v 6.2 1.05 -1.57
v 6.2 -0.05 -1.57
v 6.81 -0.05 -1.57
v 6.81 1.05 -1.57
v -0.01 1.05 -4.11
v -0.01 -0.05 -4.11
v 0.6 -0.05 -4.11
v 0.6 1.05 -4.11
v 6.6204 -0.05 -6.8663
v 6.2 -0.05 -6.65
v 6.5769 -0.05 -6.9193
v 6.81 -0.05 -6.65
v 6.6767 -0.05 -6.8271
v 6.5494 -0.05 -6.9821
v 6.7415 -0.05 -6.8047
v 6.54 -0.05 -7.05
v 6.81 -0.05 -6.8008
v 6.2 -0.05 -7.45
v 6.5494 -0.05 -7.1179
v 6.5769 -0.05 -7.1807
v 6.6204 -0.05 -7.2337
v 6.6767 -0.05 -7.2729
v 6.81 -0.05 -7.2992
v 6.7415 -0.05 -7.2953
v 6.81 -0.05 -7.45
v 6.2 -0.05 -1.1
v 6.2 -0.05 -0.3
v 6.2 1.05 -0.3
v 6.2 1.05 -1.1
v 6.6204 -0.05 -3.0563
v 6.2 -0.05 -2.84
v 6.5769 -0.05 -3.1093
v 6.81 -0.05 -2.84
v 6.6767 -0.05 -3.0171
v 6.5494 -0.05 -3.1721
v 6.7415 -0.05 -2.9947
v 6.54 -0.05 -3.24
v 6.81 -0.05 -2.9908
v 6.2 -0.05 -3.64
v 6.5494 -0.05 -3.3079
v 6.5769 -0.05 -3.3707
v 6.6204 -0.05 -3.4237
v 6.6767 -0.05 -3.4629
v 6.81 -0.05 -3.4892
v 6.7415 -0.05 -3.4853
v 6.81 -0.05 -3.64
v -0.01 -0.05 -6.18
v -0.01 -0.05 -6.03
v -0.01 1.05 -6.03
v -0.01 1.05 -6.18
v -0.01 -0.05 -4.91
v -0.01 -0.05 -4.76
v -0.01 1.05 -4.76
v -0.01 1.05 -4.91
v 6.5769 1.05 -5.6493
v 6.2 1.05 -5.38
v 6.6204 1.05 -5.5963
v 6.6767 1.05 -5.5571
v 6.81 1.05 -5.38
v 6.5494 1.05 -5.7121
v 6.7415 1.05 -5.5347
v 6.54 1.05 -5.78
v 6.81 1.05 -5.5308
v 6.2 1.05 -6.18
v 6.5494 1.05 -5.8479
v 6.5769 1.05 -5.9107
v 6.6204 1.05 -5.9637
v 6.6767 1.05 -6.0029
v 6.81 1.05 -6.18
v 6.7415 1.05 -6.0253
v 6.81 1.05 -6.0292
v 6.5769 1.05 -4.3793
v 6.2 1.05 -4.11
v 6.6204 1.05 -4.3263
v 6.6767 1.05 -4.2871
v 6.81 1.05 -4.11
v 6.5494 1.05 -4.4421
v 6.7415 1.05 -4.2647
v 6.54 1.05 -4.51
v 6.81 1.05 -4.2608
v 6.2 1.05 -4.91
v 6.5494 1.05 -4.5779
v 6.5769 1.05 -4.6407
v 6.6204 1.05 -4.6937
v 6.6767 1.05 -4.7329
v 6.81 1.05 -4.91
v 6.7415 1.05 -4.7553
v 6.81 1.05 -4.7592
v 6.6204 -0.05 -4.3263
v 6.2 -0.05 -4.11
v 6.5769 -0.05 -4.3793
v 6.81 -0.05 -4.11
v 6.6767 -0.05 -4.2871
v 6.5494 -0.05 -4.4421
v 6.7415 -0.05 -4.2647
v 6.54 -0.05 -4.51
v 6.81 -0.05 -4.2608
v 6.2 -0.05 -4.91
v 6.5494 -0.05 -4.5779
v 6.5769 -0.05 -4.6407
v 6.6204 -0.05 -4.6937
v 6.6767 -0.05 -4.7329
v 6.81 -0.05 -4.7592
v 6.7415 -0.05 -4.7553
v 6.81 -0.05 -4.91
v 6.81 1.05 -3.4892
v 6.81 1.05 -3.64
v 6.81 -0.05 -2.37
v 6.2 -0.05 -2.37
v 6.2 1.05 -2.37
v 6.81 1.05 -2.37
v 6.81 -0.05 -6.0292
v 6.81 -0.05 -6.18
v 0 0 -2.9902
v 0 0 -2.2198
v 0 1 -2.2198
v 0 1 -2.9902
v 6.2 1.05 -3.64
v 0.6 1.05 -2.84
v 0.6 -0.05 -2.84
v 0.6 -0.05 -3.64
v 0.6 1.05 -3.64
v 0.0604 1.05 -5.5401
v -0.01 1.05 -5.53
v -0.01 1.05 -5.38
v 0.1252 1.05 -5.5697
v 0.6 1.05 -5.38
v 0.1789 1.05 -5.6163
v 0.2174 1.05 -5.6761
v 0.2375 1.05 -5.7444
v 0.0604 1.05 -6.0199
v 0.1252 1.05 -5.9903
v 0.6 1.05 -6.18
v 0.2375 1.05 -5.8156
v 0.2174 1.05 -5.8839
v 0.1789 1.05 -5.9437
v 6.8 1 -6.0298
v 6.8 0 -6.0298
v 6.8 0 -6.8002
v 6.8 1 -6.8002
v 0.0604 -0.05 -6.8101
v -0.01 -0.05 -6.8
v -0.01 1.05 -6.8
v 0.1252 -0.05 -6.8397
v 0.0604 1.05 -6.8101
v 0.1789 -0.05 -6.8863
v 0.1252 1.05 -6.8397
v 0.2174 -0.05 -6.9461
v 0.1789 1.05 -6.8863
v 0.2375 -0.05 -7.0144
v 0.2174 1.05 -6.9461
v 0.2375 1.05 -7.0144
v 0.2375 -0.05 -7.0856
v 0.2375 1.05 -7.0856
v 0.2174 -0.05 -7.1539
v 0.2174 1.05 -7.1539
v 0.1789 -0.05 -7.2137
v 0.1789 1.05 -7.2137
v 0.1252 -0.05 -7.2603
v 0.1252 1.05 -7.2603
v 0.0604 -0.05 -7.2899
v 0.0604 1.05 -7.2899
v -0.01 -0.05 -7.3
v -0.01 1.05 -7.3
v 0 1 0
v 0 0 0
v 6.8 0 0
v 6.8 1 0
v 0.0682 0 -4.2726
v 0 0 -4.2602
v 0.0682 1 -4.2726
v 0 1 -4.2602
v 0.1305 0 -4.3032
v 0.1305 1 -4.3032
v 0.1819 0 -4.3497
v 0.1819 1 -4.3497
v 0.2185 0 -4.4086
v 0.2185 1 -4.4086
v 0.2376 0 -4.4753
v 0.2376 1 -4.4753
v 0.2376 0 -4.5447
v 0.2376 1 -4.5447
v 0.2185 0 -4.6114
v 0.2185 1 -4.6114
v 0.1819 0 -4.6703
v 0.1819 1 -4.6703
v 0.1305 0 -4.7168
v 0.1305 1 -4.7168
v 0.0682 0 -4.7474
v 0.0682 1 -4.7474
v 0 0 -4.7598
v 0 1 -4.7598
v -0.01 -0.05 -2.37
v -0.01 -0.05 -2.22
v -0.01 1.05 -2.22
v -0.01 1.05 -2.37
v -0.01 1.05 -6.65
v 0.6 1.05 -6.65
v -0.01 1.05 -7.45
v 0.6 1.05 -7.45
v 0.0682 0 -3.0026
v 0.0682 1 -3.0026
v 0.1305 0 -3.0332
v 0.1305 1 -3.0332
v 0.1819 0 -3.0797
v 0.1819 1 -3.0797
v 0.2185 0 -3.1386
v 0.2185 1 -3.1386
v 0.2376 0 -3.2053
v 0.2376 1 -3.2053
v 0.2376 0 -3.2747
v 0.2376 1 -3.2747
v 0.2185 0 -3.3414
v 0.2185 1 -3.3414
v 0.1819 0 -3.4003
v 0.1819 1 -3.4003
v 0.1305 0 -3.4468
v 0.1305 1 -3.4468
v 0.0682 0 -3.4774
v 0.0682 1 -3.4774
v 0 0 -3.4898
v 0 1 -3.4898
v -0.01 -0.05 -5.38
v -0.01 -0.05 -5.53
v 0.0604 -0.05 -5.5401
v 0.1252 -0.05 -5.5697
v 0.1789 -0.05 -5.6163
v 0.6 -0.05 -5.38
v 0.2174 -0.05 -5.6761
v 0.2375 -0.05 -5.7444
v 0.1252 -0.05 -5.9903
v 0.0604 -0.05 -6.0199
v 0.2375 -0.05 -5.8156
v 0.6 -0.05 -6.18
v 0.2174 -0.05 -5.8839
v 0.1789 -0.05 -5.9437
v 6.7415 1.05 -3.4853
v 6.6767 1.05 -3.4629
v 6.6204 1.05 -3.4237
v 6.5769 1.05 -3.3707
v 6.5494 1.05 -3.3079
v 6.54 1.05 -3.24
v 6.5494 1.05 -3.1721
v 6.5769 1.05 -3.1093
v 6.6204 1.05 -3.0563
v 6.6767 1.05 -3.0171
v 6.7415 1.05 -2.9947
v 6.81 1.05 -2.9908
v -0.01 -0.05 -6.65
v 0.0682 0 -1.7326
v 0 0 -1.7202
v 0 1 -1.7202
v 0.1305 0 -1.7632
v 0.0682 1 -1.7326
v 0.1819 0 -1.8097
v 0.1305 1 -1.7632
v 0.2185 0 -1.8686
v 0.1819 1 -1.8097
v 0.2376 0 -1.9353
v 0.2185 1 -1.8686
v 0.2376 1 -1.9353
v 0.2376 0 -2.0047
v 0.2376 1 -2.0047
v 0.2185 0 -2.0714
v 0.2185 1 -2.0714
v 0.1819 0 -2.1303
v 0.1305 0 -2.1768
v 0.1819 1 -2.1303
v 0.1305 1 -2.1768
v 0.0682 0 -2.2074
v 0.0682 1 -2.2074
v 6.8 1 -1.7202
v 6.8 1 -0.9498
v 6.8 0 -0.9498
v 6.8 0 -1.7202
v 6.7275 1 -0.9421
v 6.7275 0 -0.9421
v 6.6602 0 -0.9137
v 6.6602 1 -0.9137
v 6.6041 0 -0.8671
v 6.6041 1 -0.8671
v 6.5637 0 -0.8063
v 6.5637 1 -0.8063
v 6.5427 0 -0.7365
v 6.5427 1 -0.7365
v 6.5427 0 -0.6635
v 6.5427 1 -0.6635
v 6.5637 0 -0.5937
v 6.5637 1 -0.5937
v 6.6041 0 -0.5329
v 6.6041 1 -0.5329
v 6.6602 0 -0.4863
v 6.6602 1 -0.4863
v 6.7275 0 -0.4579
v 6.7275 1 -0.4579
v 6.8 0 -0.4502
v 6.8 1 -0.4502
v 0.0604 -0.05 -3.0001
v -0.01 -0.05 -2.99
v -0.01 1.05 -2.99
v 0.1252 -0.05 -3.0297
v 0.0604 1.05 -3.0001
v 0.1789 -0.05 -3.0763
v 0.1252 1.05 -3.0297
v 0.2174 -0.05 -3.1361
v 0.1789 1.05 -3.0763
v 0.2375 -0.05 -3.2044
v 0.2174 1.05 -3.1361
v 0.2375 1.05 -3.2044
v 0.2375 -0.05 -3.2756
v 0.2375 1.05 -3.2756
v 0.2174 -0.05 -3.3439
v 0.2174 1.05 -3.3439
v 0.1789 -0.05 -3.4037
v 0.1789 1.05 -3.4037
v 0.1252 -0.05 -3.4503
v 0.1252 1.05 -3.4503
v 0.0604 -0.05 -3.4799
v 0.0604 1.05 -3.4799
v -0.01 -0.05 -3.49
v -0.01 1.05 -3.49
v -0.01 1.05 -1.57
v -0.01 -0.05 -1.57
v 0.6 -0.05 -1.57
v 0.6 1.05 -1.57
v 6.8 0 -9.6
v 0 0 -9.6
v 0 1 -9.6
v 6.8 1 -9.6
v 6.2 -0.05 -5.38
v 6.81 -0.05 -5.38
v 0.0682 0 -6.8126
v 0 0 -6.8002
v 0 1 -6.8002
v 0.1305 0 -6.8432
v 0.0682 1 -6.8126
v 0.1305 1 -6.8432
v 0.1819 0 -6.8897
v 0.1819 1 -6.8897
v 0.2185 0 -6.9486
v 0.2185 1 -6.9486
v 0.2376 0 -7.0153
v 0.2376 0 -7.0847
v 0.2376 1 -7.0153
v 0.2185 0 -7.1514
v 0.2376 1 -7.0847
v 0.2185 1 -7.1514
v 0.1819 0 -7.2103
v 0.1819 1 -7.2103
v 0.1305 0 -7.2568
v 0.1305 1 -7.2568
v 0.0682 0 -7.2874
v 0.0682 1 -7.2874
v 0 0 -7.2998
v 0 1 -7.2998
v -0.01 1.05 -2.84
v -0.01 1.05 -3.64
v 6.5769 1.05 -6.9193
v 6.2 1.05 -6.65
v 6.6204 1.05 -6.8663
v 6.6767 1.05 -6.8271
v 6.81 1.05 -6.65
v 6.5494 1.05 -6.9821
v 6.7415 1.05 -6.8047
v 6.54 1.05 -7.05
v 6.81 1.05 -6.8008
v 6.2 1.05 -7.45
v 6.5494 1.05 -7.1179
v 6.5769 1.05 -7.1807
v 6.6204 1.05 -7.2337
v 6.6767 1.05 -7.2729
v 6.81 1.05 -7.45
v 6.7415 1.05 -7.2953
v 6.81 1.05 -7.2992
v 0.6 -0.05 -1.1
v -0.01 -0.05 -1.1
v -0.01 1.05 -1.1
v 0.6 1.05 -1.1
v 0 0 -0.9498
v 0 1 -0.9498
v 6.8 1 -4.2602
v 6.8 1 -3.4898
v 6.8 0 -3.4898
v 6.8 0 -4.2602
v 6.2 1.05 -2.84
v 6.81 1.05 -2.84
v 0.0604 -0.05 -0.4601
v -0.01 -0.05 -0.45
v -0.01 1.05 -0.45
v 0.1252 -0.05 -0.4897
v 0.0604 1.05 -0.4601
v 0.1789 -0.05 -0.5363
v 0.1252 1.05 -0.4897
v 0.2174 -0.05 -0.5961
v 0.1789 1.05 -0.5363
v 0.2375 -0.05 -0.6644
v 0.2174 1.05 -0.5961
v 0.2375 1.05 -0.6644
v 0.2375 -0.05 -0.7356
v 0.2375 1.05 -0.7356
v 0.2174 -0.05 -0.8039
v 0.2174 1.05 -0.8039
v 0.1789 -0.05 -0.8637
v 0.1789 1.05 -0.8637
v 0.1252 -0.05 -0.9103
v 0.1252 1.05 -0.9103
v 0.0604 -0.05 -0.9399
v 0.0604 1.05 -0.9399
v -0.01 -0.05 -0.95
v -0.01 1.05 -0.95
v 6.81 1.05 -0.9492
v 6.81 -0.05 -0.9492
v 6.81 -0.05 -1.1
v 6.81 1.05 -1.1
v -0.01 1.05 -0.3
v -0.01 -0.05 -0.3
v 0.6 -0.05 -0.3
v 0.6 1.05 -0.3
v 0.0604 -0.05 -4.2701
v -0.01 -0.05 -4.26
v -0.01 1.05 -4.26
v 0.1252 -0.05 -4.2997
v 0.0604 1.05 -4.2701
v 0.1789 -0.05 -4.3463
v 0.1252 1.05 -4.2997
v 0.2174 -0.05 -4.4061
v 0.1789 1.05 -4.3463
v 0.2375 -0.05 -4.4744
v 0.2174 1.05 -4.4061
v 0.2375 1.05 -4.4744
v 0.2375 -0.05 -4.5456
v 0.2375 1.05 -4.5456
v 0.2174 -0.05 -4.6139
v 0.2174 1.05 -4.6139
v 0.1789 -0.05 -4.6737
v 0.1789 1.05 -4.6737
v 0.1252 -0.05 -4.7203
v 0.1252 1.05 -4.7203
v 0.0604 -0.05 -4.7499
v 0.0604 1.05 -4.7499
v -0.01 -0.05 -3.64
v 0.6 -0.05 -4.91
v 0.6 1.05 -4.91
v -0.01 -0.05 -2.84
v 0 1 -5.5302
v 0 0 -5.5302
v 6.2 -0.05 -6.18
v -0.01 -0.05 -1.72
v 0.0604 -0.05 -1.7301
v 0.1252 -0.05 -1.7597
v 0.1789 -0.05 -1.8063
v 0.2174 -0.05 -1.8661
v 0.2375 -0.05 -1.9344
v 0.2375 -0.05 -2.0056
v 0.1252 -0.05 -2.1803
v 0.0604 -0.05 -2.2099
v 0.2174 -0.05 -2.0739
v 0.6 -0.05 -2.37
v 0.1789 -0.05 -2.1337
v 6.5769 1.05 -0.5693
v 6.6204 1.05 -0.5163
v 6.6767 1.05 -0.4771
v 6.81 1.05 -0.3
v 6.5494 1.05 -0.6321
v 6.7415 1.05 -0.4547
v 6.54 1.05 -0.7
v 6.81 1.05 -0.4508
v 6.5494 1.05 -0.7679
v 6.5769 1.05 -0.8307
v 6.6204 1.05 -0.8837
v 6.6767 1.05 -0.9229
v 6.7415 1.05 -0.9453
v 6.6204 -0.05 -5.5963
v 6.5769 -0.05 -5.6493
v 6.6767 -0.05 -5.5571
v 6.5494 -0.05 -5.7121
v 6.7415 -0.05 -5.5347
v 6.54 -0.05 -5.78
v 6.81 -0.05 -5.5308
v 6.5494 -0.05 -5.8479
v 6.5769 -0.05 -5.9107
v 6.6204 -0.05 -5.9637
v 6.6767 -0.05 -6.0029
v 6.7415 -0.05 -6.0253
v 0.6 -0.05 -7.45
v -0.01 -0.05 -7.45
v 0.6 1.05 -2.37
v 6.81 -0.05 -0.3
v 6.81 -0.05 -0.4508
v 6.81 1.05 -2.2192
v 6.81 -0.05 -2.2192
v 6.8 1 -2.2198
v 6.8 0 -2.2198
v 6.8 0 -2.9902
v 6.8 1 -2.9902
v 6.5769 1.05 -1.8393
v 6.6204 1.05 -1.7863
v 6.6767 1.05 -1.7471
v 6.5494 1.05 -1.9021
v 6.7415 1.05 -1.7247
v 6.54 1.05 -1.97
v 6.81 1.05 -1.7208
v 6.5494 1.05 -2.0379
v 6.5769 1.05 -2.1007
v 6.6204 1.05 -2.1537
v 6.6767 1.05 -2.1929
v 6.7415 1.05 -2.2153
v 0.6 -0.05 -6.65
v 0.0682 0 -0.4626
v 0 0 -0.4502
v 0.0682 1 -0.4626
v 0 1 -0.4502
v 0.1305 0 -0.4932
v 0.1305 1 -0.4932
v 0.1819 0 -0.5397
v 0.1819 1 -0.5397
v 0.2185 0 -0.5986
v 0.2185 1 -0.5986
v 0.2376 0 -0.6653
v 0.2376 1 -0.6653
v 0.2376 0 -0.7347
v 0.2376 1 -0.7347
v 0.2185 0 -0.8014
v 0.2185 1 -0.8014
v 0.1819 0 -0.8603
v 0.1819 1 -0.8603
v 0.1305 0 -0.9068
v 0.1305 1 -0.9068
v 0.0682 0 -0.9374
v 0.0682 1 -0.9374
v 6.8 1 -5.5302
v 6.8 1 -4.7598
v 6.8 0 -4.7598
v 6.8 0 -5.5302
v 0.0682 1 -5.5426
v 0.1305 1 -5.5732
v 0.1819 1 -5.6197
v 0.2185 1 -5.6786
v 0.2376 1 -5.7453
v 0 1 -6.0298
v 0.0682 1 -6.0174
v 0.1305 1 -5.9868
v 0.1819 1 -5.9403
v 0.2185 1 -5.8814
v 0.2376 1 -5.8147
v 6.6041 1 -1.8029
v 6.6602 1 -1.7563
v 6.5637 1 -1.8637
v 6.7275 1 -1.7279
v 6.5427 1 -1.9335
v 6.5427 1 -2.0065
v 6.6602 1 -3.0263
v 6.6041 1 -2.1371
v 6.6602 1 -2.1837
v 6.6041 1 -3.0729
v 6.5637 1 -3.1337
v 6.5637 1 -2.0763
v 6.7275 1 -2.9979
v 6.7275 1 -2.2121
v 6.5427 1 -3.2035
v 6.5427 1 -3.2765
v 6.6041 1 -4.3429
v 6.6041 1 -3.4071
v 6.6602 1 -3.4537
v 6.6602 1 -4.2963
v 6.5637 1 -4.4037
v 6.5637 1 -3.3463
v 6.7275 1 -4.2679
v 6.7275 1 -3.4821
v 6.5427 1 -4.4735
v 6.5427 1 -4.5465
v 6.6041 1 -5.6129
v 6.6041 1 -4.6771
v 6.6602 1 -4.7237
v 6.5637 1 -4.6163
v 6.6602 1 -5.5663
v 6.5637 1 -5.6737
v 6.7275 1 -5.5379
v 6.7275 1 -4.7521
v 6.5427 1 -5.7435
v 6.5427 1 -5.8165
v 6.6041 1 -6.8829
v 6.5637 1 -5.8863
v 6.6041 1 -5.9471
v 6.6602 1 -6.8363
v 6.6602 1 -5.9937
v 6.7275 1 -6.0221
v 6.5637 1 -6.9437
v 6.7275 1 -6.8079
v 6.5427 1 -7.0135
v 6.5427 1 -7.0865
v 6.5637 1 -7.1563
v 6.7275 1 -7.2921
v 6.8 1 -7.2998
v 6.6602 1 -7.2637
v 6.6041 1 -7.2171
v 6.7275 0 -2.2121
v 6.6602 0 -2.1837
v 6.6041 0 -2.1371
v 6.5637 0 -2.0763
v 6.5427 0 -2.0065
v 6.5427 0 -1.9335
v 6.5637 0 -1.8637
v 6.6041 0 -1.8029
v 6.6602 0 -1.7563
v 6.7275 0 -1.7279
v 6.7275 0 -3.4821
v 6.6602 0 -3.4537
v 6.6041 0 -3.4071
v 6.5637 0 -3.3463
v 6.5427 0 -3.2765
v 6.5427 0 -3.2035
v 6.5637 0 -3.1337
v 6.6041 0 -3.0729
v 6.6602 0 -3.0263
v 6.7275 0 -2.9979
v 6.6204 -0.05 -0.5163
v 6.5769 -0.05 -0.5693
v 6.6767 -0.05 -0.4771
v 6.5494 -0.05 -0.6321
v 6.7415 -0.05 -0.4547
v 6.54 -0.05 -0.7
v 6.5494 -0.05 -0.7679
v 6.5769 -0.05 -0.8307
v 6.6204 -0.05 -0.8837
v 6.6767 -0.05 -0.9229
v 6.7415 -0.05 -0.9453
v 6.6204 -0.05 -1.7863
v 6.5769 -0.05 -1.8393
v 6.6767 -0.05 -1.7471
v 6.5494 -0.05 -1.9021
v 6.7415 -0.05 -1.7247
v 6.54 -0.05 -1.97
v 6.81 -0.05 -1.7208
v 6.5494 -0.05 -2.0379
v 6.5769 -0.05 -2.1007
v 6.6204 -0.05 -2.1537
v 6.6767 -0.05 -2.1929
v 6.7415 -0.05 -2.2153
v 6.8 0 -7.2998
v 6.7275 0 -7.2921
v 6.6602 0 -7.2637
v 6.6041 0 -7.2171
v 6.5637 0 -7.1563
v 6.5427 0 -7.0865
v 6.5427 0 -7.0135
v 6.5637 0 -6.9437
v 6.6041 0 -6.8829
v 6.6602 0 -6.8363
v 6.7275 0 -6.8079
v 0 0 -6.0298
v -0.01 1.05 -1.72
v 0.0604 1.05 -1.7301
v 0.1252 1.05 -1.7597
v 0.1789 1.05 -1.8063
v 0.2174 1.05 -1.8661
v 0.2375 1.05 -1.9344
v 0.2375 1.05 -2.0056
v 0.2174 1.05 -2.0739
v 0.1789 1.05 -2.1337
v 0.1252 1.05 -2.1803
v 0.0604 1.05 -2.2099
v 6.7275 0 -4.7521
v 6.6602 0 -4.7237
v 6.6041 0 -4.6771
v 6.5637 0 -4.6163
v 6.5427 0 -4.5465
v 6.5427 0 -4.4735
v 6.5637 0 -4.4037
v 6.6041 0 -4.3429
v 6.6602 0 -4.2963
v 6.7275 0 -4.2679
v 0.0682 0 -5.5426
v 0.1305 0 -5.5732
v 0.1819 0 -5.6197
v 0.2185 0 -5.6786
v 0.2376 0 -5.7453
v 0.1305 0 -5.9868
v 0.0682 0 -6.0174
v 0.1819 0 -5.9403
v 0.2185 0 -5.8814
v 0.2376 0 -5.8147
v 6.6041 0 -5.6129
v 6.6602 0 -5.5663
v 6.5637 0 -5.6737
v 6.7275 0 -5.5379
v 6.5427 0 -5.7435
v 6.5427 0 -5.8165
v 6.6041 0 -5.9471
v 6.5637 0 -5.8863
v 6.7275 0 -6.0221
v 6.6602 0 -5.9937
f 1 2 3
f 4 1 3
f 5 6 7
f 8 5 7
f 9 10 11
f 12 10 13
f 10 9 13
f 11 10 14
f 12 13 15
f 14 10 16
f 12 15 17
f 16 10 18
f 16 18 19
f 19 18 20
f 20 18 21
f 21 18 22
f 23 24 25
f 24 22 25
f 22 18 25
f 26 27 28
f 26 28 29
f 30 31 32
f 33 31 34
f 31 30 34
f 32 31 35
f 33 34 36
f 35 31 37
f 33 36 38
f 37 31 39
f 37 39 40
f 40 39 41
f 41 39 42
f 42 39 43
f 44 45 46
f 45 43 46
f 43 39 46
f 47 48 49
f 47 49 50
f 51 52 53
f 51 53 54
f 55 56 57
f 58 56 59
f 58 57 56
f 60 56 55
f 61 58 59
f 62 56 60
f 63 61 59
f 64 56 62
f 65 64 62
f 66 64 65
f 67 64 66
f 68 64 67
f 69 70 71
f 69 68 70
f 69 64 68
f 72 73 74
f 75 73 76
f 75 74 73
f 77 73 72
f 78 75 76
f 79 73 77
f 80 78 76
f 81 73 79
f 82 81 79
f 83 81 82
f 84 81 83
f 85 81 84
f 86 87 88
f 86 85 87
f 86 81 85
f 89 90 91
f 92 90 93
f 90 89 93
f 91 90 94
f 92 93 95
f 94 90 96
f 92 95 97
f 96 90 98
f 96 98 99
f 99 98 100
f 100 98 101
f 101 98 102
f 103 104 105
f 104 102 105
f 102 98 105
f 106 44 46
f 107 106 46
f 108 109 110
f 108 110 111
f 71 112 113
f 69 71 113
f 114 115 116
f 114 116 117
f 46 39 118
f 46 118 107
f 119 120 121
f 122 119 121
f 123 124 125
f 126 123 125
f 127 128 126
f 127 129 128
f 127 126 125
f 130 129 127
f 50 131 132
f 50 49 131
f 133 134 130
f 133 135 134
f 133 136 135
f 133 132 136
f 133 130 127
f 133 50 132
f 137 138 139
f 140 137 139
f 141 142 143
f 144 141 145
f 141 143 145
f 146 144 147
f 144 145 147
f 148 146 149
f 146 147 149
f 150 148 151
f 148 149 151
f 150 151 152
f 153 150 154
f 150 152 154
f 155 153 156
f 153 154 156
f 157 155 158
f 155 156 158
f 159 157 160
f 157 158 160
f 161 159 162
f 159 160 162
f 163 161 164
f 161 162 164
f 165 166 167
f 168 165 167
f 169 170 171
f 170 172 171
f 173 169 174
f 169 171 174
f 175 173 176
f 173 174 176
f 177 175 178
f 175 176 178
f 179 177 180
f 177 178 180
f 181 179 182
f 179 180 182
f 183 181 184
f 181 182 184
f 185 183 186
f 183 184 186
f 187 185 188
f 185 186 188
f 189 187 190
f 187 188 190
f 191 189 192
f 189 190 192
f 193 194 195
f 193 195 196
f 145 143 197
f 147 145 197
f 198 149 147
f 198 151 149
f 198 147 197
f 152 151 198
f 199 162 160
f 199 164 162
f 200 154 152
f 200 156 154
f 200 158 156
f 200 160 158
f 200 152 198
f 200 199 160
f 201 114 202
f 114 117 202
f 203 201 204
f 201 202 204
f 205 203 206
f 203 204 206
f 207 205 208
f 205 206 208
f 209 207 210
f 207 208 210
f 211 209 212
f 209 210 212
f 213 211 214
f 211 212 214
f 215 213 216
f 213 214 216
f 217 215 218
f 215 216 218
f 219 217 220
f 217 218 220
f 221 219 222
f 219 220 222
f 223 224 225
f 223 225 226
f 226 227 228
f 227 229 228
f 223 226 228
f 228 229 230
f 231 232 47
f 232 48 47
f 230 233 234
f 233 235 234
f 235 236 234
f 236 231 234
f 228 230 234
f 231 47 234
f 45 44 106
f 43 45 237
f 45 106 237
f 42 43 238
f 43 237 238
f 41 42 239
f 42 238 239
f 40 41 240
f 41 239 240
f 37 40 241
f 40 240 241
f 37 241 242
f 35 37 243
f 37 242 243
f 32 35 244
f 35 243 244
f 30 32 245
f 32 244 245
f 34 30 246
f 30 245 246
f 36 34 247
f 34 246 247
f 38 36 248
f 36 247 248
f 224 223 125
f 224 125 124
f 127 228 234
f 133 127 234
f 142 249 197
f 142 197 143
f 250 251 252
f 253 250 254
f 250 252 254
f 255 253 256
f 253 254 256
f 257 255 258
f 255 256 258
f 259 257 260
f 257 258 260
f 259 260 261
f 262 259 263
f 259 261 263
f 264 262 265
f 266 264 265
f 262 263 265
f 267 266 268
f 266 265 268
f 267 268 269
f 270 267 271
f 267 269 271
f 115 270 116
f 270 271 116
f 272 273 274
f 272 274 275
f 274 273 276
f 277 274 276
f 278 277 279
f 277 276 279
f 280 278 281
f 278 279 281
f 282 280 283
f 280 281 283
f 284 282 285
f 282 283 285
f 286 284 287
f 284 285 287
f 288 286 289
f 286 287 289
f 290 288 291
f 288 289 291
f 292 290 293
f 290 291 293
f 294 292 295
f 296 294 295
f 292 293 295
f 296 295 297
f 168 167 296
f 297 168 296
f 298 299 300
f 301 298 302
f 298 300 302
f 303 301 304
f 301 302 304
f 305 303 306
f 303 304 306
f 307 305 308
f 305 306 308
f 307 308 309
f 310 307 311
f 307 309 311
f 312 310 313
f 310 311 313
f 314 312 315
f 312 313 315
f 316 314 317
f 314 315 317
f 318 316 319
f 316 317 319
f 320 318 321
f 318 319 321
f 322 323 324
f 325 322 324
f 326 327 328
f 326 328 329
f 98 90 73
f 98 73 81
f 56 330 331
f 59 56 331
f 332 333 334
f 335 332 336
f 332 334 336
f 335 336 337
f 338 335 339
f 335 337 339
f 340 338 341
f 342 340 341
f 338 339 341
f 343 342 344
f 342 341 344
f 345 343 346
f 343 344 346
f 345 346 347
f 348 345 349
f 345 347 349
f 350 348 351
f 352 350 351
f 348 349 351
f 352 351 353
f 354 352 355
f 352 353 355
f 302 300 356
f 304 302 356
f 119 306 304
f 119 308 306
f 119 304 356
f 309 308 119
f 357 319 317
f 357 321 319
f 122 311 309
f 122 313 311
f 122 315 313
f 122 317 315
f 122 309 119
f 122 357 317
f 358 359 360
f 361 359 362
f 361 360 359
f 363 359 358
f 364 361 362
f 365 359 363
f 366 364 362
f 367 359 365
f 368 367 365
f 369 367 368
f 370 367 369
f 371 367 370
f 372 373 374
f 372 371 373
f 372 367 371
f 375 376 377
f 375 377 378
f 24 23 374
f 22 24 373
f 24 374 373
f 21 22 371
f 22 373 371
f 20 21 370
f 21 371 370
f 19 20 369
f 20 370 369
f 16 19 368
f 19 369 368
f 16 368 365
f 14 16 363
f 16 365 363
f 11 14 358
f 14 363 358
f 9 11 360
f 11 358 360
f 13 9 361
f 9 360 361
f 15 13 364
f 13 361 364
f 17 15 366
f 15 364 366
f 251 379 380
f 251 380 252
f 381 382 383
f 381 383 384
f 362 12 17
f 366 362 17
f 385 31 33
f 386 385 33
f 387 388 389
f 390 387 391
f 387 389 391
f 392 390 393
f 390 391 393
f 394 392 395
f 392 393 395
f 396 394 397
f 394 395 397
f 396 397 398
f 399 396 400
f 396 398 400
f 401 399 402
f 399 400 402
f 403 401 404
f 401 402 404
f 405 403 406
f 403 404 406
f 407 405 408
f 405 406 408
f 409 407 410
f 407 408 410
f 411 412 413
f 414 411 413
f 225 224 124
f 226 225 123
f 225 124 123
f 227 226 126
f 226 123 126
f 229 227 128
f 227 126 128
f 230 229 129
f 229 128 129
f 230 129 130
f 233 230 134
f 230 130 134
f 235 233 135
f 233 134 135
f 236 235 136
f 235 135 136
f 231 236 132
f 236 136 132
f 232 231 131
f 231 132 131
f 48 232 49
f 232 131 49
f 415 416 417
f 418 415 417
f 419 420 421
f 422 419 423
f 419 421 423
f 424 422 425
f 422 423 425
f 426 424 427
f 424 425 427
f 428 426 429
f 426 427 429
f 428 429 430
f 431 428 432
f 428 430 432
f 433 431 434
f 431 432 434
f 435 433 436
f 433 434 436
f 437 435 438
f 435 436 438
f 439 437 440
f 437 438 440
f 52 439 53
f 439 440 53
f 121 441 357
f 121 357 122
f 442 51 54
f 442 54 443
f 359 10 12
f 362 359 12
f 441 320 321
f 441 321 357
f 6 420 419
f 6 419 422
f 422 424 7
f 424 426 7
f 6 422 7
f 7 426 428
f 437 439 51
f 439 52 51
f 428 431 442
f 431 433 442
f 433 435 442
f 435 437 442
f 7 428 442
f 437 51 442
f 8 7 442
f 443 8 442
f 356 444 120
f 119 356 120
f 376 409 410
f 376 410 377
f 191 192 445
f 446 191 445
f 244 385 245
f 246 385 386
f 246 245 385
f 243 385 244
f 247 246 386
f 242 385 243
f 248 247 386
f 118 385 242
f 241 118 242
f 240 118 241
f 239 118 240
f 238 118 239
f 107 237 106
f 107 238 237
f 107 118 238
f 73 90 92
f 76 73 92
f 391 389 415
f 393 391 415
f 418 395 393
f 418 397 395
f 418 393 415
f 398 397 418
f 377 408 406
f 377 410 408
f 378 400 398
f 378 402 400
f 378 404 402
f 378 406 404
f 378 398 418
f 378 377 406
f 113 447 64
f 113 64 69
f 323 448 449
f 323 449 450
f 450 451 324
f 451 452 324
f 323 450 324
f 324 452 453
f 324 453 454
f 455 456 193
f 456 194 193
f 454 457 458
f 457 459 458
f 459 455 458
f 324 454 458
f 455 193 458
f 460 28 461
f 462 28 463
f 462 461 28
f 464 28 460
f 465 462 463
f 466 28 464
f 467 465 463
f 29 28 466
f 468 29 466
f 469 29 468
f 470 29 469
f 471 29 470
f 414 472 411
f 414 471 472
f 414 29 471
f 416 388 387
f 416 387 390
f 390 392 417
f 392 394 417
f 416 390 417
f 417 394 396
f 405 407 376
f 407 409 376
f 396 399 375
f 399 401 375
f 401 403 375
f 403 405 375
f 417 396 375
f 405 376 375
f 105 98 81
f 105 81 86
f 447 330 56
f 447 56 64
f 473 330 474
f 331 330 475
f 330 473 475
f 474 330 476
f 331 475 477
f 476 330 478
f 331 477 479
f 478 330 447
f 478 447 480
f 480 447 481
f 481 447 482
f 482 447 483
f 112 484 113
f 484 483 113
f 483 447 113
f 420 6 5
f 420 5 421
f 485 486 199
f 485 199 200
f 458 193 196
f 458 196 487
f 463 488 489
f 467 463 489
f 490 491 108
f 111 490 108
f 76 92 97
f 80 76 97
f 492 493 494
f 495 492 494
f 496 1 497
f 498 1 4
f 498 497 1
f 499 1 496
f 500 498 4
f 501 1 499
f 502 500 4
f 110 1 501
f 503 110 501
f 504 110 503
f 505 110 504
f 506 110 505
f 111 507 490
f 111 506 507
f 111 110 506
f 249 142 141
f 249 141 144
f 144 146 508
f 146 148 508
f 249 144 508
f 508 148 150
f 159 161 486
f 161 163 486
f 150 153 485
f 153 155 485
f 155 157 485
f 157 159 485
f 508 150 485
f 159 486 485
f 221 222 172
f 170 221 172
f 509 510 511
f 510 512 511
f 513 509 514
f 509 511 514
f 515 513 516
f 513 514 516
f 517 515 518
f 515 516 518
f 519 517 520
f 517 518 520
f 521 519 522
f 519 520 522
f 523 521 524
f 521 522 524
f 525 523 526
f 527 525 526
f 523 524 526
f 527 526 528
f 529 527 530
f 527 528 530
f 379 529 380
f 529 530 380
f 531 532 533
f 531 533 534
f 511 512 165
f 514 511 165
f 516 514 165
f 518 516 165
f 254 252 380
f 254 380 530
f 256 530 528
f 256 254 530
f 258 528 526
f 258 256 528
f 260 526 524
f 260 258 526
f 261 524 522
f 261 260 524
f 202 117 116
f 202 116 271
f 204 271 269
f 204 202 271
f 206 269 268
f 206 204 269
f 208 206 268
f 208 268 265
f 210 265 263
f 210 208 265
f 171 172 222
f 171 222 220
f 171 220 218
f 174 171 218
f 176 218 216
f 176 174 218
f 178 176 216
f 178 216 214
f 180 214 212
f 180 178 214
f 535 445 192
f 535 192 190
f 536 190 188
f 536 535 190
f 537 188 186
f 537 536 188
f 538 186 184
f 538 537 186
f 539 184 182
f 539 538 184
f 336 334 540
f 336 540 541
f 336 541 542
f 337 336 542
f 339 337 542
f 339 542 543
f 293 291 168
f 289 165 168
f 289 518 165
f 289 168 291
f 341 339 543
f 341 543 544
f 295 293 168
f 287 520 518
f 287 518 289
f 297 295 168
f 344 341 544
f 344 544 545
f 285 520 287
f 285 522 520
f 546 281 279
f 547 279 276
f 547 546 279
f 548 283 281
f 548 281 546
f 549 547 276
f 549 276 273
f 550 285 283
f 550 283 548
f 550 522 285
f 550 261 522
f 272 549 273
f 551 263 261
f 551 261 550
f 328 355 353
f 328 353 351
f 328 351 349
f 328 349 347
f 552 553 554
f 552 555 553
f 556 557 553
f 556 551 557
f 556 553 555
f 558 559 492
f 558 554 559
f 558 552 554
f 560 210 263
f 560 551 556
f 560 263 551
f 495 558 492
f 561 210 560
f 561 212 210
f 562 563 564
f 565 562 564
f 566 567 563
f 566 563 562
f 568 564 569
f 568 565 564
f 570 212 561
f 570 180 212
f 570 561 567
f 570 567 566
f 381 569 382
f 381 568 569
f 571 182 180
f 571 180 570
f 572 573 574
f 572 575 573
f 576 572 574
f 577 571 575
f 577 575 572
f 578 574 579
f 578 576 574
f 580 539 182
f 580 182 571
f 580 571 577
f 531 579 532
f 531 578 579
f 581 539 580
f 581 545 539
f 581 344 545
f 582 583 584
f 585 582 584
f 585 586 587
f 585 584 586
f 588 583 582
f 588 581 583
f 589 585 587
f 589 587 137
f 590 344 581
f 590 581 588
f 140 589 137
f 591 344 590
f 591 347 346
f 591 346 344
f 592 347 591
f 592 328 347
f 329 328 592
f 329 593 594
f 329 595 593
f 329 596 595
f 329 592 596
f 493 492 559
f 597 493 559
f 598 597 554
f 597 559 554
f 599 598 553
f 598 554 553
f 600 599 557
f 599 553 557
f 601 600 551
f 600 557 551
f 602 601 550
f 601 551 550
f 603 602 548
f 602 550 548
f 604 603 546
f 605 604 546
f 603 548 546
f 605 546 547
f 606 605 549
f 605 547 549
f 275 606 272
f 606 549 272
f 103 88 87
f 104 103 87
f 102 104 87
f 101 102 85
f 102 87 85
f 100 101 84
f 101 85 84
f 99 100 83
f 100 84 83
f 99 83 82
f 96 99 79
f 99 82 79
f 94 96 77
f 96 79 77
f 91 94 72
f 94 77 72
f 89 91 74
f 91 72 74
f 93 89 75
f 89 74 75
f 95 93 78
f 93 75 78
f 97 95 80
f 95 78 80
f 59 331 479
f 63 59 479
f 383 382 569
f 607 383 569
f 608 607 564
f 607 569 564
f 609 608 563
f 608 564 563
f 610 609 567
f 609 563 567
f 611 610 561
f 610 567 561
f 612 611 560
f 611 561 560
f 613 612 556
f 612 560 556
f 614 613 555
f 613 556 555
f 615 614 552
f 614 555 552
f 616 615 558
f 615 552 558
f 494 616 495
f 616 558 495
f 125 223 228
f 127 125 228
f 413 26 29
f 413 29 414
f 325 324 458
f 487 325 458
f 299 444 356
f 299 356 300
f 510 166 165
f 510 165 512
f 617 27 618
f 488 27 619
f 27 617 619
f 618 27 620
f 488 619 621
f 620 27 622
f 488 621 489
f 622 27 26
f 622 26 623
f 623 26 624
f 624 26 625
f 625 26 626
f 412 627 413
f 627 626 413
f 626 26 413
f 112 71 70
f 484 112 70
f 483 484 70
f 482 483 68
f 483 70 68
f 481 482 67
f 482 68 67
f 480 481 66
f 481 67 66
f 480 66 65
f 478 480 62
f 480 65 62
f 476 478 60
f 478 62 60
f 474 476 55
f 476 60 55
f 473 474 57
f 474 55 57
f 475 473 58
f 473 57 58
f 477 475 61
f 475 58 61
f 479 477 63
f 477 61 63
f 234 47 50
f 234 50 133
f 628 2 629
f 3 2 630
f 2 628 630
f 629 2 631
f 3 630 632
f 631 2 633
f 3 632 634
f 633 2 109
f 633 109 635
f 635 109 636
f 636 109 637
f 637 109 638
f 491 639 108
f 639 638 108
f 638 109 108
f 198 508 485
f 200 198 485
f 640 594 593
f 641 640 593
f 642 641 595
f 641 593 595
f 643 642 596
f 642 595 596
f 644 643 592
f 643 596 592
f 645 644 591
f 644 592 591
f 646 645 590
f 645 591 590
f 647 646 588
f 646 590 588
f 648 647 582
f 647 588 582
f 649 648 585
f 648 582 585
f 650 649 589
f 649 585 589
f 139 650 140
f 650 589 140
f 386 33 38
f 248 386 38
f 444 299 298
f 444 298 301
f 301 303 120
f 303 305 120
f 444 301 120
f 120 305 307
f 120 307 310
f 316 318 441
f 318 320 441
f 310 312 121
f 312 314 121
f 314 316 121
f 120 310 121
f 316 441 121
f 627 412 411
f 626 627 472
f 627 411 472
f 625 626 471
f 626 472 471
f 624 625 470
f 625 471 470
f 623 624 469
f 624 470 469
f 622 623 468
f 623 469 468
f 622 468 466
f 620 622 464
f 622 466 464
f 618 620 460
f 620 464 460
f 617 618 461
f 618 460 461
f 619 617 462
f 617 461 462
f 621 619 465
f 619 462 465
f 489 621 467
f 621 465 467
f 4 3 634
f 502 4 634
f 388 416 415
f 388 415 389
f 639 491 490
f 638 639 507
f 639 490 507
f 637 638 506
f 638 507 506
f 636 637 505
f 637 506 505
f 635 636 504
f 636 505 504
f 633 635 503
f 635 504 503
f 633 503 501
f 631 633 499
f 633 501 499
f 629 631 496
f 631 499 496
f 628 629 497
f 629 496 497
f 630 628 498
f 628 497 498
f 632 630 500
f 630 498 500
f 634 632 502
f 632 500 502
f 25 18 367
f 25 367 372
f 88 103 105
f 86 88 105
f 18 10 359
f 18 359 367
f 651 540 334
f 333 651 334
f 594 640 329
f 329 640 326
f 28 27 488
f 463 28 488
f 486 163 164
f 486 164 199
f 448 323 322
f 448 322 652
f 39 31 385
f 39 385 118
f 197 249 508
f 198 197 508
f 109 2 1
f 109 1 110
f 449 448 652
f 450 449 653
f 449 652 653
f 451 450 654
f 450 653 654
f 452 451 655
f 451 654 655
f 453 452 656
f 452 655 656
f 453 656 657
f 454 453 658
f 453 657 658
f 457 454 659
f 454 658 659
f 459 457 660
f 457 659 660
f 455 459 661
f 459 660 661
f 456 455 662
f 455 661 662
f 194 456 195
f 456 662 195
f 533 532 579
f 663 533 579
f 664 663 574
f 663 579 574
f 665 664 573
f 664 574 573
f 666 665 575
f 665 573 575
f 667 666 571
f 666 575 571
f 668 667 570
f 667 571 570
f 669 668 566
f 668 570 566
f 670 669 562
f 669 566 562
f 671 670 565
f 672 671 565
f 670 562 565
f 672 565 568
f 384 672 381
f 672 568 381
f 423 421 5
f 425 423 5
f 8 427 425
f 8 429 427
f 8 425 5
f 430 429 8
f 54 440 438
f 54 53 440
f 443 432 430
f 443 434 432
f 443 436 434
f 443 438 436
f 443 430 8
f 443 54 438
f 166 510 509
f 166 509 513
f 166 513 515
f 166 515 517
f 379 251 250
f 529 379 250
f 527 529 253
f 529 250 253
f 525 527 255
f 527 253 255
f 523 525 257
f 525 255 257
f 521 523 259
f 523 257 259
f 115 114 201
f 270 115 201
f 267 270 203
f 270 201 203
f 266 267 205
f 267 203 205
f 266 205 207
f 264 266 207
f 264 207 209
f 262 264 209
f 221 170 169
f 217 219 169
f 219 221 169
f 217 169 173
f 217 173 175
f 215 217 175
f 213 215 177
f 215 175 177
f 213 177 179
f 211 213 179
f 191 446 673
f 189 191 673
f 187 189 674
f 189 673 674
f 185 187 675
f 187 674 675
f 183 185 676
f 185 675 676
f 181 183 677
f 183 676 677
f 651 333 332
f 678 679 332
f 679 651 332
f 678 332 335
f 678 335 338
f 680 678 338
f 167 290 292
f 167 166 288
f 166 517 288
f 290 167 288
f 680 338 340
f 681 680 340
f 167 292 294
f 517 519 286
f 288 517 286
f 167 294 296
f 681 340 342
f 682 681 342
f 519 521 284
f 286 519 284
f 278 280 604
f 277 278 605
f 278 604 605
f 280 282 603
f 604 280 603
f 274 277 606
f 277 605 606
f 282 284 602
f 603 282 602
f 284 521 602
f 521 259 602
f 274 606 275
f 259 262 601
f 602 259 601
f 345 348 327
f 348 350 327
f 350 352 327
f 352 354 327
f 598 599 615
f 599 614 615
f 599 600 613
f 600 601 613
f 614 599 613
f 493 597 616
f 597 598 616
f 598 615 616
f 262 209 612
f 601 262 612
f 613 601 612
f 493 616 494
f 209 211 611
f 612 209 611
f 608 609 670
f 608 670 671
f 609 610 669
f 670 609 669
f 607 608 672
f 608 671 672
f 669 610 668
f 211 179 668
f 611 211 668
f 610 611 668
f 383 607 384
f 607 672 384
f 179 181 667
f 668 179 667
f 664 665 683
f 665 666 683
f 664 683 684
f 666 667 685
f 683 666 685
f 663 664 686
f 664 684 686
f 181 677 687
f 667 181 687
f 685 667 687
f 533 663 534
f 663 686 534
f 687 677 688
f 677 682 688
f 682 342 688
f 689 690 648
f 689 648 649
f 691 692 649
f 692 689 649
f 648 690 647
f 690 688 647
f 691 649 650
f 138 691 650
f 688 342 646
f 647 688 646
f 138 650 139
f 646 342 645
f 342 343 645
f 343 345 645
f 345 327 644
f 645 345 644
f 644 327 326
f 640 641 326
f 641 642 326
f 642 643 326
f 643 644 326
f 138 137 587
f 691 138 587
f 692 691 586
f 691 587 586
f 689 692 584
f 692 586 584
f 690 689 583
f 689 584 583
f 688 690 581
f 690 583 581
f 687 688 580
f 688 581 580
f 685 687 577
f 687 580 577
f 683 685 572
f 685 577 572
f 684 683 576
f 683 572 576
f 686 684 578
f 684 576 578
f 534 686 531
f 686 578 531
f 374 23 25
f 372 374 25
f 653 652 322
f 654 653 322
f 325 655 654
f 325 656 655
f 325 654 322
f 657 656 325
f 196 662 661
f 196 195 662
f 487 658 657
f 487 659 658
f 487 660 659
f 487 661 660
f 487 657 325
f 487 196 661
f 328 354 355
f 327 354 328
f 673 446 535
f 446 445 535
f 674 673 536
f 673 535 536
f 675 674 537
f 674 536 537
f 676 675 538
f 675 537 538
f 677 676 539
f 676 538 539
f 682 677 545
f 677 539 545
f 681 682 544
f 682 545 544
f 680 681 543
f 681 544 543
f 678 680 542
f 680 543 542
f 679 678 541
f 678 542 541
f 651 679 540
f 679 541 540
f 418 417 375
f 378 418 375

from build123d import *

# Parameters (mm, degrees)
SKETCH_1_W              = 6.8
SKETCH_1_H              = 9.6
EXTRUDE_1_DEPTH         = 1
EXTRUDE_2_DEPTH         = 0.05
EXTRUDE_2_DEPTH_BACK    = 1.05
SKETCH_2_W              = 0.61
SKETCH_2_H              = 0.8
EXTRUDE_2_2_DEPTH       = 0.05
EXTRUDE_2_2_DEPTH_BACK  = 1.05
EXTRUDE_2_3_DEPTH       = 0.05
EXTRUDE_2_3_DEPTH_BACK  = 1.05
EXTRUDE_2_4_DEPTH       = 0.05
EXTRUDE_2_4_DEPTH_BACK  = 1.05
EXTRUDE_2_5_DEPTH       = 0.05
EXTRUDE_2_5_DEPTH_BACK  = 1.05
EXTRUDE_2_6_DEPTH       = 0.05
EXTRUDE_2_6_DEPTH_BACK  = 1.05
EXTRUDE_2_7_DEPTH       = 0.05
EXTRUDE_2_7_DEPTH_BACK  = 1.05
EXTRUDE_2_8_DEPTH       = 0.05
EXTRUDE_2_8_DEPTH_BACK  = 1.05
EXTRUDE_2_9_DEPTH       = 0.05
EXTRUDE_2_9_DEPTH_BACK  = 1.05
EXTRUDE_2_10_DEPTH      = 0.05
EXTRUDE_2_10_DEPTH_BACK = 1.05
EXTRUDE_2_11_DEPTH      = 0.05
EXTRUDE_2_11_DEPTH_BACK = 1.05
EXTRUDE_2_12_DEPTH      = 0.05
EXTRUDE_2_12_DEPTH_BACK = 1.05
SKETCH_4_R              = 0.25
CUT_EXTRUDE_2_DEPTH     = 12.821425464


with BuildPart() as part:
    # 草图1 → 凸台-拉伸1 (new body)
    with BuildSketch(Plane(origin=(0, 0, 0), x_dir=(1, 0, 0), z_dir=(0, 1, 0))):
        with Locations((3.4, 4.8)):
            Rectangle(SKETCH_1_W, SKETCH_1_H)
    extrude(amount=EXTRUDE_1_DEPTH)


with BuildPart() as body_2:
    # 草图2 → 凸台-拉伸2 (new, two sides: drawn at the far end of the back side and taken through both)
    with BuildSketch(Plane(origin=(0, 1, 0), x_dir=(1, 0, 0), z_dir=(0, 1, 0)).offset(-EXTRUDE_2_DEPTH_BACK)):
        with Locations((0.295, 0.7)):
            Rectangle(SKETCH_2_W, SKETCH_2_H)
    extrude(amount=EXTRUDE_2_DEPTH + EXTRUDE_2_DEPTH_BACK)


with BuildPart() as body_3:
    # 草图2 → Extrude 2 2 (new, two sides: drawn at the far end of the back side and taken through both)
    with BuildSketch(Plane(origin=(0, 1, 0), x_dir=(1, 0, 0), z_dir=(0, 1, 0)).offset(-EXTRUDE_2_2_DEPTH_BACK)):
        with Locations((0.295, 1.97)):
            Rectangle(SKETCH_2_W, SKETCH_2_H)
    extrude(amount=EXTRUDE_2_2_DEPTH + EXTRUDE_2_2_DEPTH_BACK)


with BuildPart() as body_4:
    # 草图2 → Extrude 2 3 (new, two sides: drawn at the far end of the back side and taken through both)
    with BuildSketch(Plane(origin=(0, 1, 0), x_dir=(1, 0, 0), z_dir=(0, 1, 0)).offset(-EXTRUDE_2_3_DEPTH_BACK)):
        with Locations((0.295, 3.24)):
            Rectangle(SKETCH_2_W, SKETCH_2_H)
    extrude(amount=EXTRUDE_2_3_DEPTH + EXTRUDE_2_3_DEPTH_BACK)


with BuildPart() as body_5:
    # 草图2 → Extrude 2 4 (new, two sides: drawn at the far end of the back side and taken through both)
    with BuildSketch(Plane(origin=(0, 1, 0), x_dir=(1, 0, 0), z_dir=(0, 1, 0)).offset(-EXTRUDE_2_4_DEPTH_BACK)):
        with Locations((0.295, 4.51)):
            Rectangle(SKETCH_2_W, SKETCH_2_H)
    extrude(amount=EXTRUDE_2_4_DEPTH + EXTRUDE_2_4_DEPTH_BACK)


with BuildPart() as body_6:
    # 草图2 → Extrude 2 5 (new, two sides: drawn at the far end of the back side and taken through both)
    with BuildSketch(Plane(origin=(0, 1, 0), x_dir=(1, 0, 0), z_dir=(0, 1, 0)).offset(-EXTRUDE_2_5_DEPTH_BACK)):
        with Locations((0.295, 5.78)):
            Rectangle(SKETCH_2_W, SKETCH_2_H)
    extrude(amount=EXTRUDE_2_5_DEPTH + EXTRUDE_2_5_DEPTH_BACK)


with BuildPart() as body_7:
    # 草图2 → Extrude 2 6 (new, two sides: drawn at the far end of the back side and taken through both)
    with BuildSketch(Plane(origin=(0, 1, 0), x_dir=(1, 0, 0), z_dir=(0, 1, 0)).offset(-EXTRUDE_2_6_DEPTH_BACK)):
        with Locations((0.295, 7.05)):
            Rectangle(SKETCH_2_W, SKETCH_2_H)
    extrude(amount=EXTRUDE_2_6_DEPTH + EXTRUDE_2_6_DEPTH_BACK)


with BuildPart() as body_8:
    # 草图2 → Extrude 2 7 (new, two sides: drawn at the far end of the back side and taken through both)
    with BuildSketch(Plane(origin=(0, 1, 0), x_dir=(1, 0, 0), z_dir=(0, 1, 0)).offset(-EXTRUDE_2_7_DEPTH_BACK)):
        with Locations((6.505, 7.05)):
            Rectangle(SKETCH_2_W, SKETCH_2_H)
    extrude(amount=EXTRUDE_2_7_DEPTH + EXTRUDE_2_7_DEPTH_BACK)


with BuildPart() as body_9:
    # 草图2 → Extrude 2 8 (new, two sides: drawn at the far end of the back side and taken through both)
    with BuildSketch(Plane(origin=(0, 1, 0), x_dir=(1, 0, 0), z_dir=(0, 1, 0)).offset(-EXTRUDE_2_8_DEPTH_BACK)):
        with Locations((6.505, 5.78)):
            Rectangle(SKETCH_2_W, SKETCH_2_H)
    extrude(amount=EXTRUDE_2_8_DEPTH + EXTRUDE_2_8_DEPTH_BACK)


with BuildPart() as body_10:
    # 草图2 → Extrude 2 9 (new, two sides: drawn at the far end of the back side and taken through both)
    with BuildSketch(Plane(origin=(0, 1, 0), x_dir=(1, 0, 0), z_dir=(0, 1, 0)).offset(-EXTRUDE_2_9_DEPTH_BACK)):
        with Locations((6.505, 4.51)):
            Rectangle(SKETCH_2_W, SKETCH_2_H)
    extrude(amount=EXTRUDE_2_9_DEPTH + EXTRUDE_2_9_DEPTH_BACK)


with BuildPart() as body_11:
    # 草图2 → Extrude 2 10 (new, two sides: drawn at the far end of the back side and taken through both)
    with BuildSketch(Plane(origin=(0, 1, 0), x_dir=(1, 0, 0), z_dir=(0, 1, 0)).offset(-EXTRUDE_2_10_DEPTH_BACK)):
        with Locations((6.505, 3.24)):
            Rectangle(SKETCH_2_W, SKETCH_2_H)
    extrude(amount=EXTRUDE_2_10_DEPTH + EXTRUDE_2_10_DEPTH_BACK)


with BuildPart() as body_12:
    # 草图2 → Extrude 2 11 (new, two sides: drawn at the far end of the back side and taken through both)
    with BuildSketch(Plane(origin=(0, 1, 0), x_dir=(1, 0, 0), z_dir=(0, 1, 0)).offset(-EXTRUDE_2_11_DEPTH_BACK)):
        with Locations((6.505, 0.7)):
            Rectangle(SKETCH_2_W, SKETCH_2_H)
    extrude(amount=EXTRUDE_2_11_DEPTH + EXTRUDE_2_11_DEPTH_BACK)


with BuildPart() as body_13:
    # 草图2 → Extrude 2 12 (new, two sides: drawn at the far end of the back side and taken through both)
    with BuildSketch(Plane(origin=(0, 1, 0), x_dir=(1, 0, 0), z_dir=(0, 1, 0)).offset(-EXTRUDE_2_12_DEPTH_BACK)):
        with Locations((6.505, 1.97)):
            Rectangle(SKETCH_2_W, SKETCH_2_H)
    extrude(amount=EXTRUDE_2_12_DEPTH + EXTRUDE_2_12_DEPTH_BACK)


with BuildPart() as cut_extrude_2_tool:
    # 草图4 → 切除-拉伸2 (new, through all)
    with BuildSketch(Plane(origin=(0, 1.05, 0), x_dir=(1, 0, 0), z_dir=(0, 1, 0))):
        with Locations((-0.01, 0.7)):
            Circle(SKETCH_4_R)
        with Locations((6.79, 0.7)):
            Circle(SKETCH_4_R)
        with Locations((6.79, 1.97)):
            Circle(SKETCH_4_R)
        with Locations((6.79, 3.24)):
            Circle(SKETCH_4_R)
        with Locations((6.79, 4.51)):
            Circle(SKETCH_4_R)
        with Locations((6.79, 5.78)):
            Circle(SKETCH_4_R)
        with Locations((6.79, 7.05)):
            Circle(SKETCH_4_R)
        with Locations((-0.01, 1.97)):
            Circle(SKETCH_4_R)
        with Locations((-0.01, 3.24)):
            Circle(SKETCH_4_R)
        with Locations((-0.01, 4.51)):
            Circle(SKETCH_4_R)
        with Locations((-0.01, 5.78)):
            Circle(SKETCH_4_R)
        with Locations((-0.01, 7.05)):
            Circle(SKETCH_4_R)
    extrude(amount=-CUT_EXTRUDE_2_DEPTH)


with BuildPart() as part_1:
    add(part.part)

    # 切除-拉伸2: cut by cut_extrude_2_tool
    add(cut_extrude_2_tool.part, mode=Mode.SUBTRACT)


with BuildPart() as body_2_1:
    add(body_2.part)

    # 切除-拉伸2: cut by cut_extrude_2_tool
    add(cut_extrude_2_tool.part, mode=Mode.SUBTRACT)


with BuildPart() as body_3_1:
    add(body_3.part)

    # 切除-拉伸2: cut by cut_extrude_2_tool
    add(cut_extrude_2_tool.part, mode=Mode.SUBTRACT)


with BuildPart() as body_4_1:
    add(body_4.part)

    # 切除-拉伸2: cut by cut_extrude_2_tool
    add(cut_extrude_2_tool.part, mode=Mode.SUBTRACT)


with BuildPart() as body_5_1:
    add(body_5.part)

    # 切除-拉伸2: cut by cut_extrude_2_tool
    add(cut_extrude_2_tool.part, mode=Mode.SUBTRACT)


with BuildPart() as body_6_1:
    add(body_6.part)

    # 切除-拉伸2: cut by cut_extrude_2_tool
    add(cut_extrude_2_tool.part, mode=Mode.SUBTRACT)


with BuildPart() as body_7_1:
    add(body_7.part)

    # 切除-拉伸2: cut by cut_extrude_2_tool
    add(cut_extrude_2_tool.part, mode=Mode.SUBTRACT)


with BuildPart() as body_8_1:
    add(body_8.part)

    # 切除-拉伸2: cut by cut_extrude_2_tool
    add(cut_extrude_2_tool.part, mode=Mode.SUBTRACT)


with BuildPart() as body_9_1:
    add(body_9.part)

    # 切除-拉伸2: cut by cut_extrude_2_tool
    add(cut_extrude_2_tool.part, mode=Mode.SUBTRACT)


with BuildPart() as body_10_1:
    add(body_10.part)

    # 切除-拉伸2: cut by cut_extrude_2_tool
    add(cut_extrude_2_tool.part, mode=Mode.SUBTRACT)


with BuildPart() as body_11_1:
    add(body_11.part)

    # 切除-拉伸2: cut by cut_extrude_2_tool
    add(cut_extrude_2_tool.part, mode=Mode.SUBTRACT)


with BuildPart() as body_12_1:
    add(body_12.part)

    # 切除-拉伸2: cut by cut_extrude_2_tool
    add(cut_extrude_2_tool.part, mode=Mode.SUBTRACT)


with BuildPart() as body_13_1:
    add(body_13.part)

    # 切除-拉伸2: cut by cut_extrude_2_tool
    add(cut_extrude_2_tool.part, mode=Mode.SUBTRACT)


solid = Compound([part_1.part, body_2_1.part, body_3_1.part, body_4_1.part, body_5_1.part, body_6_1.part, body_7_1.part, body_8_1.part, body_9_1.part, body_10_1.part, body_11_1.part, body_12_1.part, body_13_1.part])
